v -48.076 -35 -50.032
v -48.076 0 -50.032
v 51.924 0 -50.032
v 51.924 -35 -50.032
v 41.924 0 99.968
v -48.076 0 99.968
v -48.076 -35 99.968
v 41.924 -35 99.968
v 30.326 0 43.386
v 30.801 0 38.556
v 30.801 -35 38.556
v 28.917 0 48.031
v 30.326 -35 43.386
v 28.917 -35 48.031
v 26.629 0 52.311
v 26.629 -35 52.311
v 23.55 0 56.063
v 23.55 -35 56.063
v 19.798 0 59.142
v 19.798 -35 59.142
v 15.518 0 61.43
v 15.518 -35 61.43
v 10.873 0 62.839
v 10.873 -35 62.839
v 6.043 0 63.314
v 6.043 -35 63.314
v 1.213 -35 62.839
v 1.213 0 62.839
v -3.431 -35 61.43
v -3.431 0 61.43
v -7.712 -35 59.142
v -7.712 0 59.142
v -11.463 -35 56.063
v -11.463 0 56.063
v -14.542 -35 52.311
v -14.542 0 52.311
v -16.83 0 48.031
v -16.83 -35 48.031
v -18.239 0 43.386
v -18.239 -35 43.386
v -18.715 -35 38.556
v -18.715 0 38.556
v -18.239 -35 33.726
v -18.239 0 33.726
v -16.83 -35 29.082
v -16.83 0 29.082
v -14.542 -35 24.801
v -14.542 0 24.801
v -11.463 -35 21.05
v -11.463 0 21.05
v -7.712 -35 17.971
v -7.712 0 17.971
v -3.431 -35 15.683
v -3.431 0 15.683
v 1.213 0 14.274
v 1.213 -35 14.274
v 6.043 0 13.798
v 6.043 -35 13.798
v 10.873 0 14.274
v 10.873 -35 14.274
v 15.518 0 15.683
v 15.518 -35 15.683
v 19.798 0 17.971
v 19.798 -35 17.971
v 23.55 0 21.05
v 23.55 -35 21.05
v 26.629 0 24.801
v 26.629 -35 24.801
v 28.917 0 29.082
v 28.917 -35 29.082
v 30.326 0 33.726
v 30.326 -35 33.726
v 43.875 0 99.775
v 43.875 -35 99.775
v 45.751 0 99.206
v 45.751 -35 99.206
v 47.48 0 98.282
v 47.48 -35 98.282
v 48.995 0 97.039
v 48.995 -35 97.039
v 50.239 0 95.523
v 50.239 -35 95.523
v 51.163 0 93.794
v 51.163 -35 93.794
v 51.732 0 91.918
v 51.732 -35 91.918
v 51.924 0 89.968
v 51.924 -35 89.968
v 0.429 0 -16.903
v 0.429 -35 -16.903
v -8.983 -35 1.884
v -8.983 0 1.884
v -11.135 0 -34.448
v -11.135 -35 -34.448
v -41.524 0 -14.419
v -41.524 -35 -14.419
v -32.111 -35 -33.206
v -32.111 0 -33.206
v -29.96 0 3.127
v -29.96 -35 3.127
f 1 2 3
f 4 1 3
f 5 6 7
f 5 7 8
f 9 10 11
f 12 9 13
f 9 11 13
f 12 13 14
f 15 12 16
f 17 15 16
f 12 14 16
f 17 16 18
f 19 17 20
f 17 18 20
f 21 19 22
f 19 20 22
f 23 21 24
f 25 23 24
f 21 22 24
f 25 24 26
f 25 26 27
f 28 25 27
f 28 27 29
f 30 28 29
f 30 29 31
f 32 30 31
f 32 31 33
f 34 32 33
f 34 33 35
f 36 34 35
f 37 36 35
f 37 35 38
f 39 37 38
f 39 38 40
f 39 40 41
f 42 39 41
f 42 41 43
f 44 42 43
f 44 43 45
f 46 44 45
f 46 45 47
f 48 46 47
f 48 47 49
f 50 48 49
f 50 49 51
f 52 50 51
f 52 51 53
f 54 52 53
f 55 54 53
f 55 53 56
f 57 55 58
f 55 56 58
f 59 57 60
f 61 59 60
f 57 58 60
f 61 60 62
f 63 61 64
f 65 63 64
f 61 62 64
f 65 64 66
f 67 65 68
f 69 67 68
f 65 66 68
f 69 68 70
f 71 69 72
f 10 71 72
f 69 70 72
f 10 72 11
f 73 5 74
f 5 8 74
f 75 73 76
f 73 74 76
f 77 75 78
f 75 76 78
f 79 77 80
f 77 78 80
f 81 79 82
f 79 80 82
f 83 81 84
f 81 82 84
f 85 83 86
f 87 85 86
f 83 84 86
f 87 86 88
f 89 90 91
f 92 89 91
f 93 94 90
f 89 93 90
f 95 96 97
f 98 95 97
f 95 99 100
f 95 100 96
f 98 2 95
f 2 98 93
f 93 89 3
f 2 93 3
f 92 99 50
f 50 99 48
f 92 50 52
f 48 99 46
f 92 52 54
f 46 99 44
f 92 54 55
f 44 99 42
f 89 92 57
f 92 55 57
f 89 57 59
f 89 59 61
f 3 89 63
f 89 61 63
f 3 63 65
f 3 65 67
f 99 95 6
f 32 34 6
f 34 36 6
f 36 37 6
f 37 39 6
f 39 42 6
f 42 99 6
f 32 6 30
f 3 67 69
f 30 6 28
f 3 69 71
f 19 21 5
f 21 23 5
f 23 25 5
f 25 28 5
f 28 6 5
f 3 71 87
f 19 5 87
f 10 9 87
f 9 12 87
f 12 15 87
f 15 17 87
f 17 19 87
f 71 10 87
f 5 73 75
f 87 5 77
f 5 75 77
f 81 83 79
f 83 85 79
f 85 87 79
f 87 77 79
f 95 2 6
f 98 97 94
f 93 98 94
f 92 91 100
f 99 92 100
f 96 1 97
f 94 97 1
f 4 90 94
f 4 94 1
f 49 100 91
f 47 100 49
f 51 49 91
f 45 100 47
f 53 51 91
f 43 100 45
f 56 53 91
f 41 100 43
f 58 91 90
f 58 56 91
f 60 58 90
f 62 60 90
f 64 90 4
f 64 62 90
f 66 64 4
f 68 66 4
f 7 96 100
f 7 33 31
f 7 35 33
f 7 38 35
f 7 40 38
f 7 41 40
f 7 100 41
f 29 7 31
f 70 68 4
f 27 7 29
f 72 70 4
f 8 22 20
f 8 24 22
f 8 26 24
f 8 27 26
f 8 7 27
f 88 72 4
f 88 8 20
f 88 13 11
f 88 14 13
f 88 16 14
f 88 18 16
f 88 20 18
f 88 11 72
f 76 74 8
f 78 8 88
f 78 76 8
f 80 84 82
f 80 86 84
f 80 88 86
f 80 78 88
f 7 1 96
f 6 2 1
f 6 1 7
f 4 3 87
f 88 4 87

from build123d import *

# Parameters (mm, degrees)
F0_W     = 100
F0_H     = 150
F1_DEPTH = 35
F2_R     = 24.758071
F3_DEPTH = 93
F4_R     = 10


with BuildPart() as f1:
    # F0 (on Front) → F1 (new body)
    with BuildSketch(Plane.XZ):
        with Locations((1.924342, 24.967596)):
            Rectangle(F0_W, F0_H)
    extrude(amount=F1_DEPTH)

    # F2 (on face) → F3 (cut)
    with BuildSketch(Plane.XZ.offset(35)):
        with Locations((6.043291, 38.55627)):
            Circle(F2_R)
        Polygon((-11.134558, -34.447833), (0.429299, -16.902675), (-8.983325, 1.884497), (-29.959805, 3.126512), (-41.523662, -14.418645), (-32.111038, -33.205818), align=None)
    extrude(amount=-F3_DEPTH, mode=Mode.SUBTRACT)

    # F4
    f4_edges = [f1.edges().sort_by_distance(p)[0] for p in [
        (51.924342, -17.5, 99.967596),
    ]]
    fillet(f4_edges, radius=F4_R)


solid = f1.part
